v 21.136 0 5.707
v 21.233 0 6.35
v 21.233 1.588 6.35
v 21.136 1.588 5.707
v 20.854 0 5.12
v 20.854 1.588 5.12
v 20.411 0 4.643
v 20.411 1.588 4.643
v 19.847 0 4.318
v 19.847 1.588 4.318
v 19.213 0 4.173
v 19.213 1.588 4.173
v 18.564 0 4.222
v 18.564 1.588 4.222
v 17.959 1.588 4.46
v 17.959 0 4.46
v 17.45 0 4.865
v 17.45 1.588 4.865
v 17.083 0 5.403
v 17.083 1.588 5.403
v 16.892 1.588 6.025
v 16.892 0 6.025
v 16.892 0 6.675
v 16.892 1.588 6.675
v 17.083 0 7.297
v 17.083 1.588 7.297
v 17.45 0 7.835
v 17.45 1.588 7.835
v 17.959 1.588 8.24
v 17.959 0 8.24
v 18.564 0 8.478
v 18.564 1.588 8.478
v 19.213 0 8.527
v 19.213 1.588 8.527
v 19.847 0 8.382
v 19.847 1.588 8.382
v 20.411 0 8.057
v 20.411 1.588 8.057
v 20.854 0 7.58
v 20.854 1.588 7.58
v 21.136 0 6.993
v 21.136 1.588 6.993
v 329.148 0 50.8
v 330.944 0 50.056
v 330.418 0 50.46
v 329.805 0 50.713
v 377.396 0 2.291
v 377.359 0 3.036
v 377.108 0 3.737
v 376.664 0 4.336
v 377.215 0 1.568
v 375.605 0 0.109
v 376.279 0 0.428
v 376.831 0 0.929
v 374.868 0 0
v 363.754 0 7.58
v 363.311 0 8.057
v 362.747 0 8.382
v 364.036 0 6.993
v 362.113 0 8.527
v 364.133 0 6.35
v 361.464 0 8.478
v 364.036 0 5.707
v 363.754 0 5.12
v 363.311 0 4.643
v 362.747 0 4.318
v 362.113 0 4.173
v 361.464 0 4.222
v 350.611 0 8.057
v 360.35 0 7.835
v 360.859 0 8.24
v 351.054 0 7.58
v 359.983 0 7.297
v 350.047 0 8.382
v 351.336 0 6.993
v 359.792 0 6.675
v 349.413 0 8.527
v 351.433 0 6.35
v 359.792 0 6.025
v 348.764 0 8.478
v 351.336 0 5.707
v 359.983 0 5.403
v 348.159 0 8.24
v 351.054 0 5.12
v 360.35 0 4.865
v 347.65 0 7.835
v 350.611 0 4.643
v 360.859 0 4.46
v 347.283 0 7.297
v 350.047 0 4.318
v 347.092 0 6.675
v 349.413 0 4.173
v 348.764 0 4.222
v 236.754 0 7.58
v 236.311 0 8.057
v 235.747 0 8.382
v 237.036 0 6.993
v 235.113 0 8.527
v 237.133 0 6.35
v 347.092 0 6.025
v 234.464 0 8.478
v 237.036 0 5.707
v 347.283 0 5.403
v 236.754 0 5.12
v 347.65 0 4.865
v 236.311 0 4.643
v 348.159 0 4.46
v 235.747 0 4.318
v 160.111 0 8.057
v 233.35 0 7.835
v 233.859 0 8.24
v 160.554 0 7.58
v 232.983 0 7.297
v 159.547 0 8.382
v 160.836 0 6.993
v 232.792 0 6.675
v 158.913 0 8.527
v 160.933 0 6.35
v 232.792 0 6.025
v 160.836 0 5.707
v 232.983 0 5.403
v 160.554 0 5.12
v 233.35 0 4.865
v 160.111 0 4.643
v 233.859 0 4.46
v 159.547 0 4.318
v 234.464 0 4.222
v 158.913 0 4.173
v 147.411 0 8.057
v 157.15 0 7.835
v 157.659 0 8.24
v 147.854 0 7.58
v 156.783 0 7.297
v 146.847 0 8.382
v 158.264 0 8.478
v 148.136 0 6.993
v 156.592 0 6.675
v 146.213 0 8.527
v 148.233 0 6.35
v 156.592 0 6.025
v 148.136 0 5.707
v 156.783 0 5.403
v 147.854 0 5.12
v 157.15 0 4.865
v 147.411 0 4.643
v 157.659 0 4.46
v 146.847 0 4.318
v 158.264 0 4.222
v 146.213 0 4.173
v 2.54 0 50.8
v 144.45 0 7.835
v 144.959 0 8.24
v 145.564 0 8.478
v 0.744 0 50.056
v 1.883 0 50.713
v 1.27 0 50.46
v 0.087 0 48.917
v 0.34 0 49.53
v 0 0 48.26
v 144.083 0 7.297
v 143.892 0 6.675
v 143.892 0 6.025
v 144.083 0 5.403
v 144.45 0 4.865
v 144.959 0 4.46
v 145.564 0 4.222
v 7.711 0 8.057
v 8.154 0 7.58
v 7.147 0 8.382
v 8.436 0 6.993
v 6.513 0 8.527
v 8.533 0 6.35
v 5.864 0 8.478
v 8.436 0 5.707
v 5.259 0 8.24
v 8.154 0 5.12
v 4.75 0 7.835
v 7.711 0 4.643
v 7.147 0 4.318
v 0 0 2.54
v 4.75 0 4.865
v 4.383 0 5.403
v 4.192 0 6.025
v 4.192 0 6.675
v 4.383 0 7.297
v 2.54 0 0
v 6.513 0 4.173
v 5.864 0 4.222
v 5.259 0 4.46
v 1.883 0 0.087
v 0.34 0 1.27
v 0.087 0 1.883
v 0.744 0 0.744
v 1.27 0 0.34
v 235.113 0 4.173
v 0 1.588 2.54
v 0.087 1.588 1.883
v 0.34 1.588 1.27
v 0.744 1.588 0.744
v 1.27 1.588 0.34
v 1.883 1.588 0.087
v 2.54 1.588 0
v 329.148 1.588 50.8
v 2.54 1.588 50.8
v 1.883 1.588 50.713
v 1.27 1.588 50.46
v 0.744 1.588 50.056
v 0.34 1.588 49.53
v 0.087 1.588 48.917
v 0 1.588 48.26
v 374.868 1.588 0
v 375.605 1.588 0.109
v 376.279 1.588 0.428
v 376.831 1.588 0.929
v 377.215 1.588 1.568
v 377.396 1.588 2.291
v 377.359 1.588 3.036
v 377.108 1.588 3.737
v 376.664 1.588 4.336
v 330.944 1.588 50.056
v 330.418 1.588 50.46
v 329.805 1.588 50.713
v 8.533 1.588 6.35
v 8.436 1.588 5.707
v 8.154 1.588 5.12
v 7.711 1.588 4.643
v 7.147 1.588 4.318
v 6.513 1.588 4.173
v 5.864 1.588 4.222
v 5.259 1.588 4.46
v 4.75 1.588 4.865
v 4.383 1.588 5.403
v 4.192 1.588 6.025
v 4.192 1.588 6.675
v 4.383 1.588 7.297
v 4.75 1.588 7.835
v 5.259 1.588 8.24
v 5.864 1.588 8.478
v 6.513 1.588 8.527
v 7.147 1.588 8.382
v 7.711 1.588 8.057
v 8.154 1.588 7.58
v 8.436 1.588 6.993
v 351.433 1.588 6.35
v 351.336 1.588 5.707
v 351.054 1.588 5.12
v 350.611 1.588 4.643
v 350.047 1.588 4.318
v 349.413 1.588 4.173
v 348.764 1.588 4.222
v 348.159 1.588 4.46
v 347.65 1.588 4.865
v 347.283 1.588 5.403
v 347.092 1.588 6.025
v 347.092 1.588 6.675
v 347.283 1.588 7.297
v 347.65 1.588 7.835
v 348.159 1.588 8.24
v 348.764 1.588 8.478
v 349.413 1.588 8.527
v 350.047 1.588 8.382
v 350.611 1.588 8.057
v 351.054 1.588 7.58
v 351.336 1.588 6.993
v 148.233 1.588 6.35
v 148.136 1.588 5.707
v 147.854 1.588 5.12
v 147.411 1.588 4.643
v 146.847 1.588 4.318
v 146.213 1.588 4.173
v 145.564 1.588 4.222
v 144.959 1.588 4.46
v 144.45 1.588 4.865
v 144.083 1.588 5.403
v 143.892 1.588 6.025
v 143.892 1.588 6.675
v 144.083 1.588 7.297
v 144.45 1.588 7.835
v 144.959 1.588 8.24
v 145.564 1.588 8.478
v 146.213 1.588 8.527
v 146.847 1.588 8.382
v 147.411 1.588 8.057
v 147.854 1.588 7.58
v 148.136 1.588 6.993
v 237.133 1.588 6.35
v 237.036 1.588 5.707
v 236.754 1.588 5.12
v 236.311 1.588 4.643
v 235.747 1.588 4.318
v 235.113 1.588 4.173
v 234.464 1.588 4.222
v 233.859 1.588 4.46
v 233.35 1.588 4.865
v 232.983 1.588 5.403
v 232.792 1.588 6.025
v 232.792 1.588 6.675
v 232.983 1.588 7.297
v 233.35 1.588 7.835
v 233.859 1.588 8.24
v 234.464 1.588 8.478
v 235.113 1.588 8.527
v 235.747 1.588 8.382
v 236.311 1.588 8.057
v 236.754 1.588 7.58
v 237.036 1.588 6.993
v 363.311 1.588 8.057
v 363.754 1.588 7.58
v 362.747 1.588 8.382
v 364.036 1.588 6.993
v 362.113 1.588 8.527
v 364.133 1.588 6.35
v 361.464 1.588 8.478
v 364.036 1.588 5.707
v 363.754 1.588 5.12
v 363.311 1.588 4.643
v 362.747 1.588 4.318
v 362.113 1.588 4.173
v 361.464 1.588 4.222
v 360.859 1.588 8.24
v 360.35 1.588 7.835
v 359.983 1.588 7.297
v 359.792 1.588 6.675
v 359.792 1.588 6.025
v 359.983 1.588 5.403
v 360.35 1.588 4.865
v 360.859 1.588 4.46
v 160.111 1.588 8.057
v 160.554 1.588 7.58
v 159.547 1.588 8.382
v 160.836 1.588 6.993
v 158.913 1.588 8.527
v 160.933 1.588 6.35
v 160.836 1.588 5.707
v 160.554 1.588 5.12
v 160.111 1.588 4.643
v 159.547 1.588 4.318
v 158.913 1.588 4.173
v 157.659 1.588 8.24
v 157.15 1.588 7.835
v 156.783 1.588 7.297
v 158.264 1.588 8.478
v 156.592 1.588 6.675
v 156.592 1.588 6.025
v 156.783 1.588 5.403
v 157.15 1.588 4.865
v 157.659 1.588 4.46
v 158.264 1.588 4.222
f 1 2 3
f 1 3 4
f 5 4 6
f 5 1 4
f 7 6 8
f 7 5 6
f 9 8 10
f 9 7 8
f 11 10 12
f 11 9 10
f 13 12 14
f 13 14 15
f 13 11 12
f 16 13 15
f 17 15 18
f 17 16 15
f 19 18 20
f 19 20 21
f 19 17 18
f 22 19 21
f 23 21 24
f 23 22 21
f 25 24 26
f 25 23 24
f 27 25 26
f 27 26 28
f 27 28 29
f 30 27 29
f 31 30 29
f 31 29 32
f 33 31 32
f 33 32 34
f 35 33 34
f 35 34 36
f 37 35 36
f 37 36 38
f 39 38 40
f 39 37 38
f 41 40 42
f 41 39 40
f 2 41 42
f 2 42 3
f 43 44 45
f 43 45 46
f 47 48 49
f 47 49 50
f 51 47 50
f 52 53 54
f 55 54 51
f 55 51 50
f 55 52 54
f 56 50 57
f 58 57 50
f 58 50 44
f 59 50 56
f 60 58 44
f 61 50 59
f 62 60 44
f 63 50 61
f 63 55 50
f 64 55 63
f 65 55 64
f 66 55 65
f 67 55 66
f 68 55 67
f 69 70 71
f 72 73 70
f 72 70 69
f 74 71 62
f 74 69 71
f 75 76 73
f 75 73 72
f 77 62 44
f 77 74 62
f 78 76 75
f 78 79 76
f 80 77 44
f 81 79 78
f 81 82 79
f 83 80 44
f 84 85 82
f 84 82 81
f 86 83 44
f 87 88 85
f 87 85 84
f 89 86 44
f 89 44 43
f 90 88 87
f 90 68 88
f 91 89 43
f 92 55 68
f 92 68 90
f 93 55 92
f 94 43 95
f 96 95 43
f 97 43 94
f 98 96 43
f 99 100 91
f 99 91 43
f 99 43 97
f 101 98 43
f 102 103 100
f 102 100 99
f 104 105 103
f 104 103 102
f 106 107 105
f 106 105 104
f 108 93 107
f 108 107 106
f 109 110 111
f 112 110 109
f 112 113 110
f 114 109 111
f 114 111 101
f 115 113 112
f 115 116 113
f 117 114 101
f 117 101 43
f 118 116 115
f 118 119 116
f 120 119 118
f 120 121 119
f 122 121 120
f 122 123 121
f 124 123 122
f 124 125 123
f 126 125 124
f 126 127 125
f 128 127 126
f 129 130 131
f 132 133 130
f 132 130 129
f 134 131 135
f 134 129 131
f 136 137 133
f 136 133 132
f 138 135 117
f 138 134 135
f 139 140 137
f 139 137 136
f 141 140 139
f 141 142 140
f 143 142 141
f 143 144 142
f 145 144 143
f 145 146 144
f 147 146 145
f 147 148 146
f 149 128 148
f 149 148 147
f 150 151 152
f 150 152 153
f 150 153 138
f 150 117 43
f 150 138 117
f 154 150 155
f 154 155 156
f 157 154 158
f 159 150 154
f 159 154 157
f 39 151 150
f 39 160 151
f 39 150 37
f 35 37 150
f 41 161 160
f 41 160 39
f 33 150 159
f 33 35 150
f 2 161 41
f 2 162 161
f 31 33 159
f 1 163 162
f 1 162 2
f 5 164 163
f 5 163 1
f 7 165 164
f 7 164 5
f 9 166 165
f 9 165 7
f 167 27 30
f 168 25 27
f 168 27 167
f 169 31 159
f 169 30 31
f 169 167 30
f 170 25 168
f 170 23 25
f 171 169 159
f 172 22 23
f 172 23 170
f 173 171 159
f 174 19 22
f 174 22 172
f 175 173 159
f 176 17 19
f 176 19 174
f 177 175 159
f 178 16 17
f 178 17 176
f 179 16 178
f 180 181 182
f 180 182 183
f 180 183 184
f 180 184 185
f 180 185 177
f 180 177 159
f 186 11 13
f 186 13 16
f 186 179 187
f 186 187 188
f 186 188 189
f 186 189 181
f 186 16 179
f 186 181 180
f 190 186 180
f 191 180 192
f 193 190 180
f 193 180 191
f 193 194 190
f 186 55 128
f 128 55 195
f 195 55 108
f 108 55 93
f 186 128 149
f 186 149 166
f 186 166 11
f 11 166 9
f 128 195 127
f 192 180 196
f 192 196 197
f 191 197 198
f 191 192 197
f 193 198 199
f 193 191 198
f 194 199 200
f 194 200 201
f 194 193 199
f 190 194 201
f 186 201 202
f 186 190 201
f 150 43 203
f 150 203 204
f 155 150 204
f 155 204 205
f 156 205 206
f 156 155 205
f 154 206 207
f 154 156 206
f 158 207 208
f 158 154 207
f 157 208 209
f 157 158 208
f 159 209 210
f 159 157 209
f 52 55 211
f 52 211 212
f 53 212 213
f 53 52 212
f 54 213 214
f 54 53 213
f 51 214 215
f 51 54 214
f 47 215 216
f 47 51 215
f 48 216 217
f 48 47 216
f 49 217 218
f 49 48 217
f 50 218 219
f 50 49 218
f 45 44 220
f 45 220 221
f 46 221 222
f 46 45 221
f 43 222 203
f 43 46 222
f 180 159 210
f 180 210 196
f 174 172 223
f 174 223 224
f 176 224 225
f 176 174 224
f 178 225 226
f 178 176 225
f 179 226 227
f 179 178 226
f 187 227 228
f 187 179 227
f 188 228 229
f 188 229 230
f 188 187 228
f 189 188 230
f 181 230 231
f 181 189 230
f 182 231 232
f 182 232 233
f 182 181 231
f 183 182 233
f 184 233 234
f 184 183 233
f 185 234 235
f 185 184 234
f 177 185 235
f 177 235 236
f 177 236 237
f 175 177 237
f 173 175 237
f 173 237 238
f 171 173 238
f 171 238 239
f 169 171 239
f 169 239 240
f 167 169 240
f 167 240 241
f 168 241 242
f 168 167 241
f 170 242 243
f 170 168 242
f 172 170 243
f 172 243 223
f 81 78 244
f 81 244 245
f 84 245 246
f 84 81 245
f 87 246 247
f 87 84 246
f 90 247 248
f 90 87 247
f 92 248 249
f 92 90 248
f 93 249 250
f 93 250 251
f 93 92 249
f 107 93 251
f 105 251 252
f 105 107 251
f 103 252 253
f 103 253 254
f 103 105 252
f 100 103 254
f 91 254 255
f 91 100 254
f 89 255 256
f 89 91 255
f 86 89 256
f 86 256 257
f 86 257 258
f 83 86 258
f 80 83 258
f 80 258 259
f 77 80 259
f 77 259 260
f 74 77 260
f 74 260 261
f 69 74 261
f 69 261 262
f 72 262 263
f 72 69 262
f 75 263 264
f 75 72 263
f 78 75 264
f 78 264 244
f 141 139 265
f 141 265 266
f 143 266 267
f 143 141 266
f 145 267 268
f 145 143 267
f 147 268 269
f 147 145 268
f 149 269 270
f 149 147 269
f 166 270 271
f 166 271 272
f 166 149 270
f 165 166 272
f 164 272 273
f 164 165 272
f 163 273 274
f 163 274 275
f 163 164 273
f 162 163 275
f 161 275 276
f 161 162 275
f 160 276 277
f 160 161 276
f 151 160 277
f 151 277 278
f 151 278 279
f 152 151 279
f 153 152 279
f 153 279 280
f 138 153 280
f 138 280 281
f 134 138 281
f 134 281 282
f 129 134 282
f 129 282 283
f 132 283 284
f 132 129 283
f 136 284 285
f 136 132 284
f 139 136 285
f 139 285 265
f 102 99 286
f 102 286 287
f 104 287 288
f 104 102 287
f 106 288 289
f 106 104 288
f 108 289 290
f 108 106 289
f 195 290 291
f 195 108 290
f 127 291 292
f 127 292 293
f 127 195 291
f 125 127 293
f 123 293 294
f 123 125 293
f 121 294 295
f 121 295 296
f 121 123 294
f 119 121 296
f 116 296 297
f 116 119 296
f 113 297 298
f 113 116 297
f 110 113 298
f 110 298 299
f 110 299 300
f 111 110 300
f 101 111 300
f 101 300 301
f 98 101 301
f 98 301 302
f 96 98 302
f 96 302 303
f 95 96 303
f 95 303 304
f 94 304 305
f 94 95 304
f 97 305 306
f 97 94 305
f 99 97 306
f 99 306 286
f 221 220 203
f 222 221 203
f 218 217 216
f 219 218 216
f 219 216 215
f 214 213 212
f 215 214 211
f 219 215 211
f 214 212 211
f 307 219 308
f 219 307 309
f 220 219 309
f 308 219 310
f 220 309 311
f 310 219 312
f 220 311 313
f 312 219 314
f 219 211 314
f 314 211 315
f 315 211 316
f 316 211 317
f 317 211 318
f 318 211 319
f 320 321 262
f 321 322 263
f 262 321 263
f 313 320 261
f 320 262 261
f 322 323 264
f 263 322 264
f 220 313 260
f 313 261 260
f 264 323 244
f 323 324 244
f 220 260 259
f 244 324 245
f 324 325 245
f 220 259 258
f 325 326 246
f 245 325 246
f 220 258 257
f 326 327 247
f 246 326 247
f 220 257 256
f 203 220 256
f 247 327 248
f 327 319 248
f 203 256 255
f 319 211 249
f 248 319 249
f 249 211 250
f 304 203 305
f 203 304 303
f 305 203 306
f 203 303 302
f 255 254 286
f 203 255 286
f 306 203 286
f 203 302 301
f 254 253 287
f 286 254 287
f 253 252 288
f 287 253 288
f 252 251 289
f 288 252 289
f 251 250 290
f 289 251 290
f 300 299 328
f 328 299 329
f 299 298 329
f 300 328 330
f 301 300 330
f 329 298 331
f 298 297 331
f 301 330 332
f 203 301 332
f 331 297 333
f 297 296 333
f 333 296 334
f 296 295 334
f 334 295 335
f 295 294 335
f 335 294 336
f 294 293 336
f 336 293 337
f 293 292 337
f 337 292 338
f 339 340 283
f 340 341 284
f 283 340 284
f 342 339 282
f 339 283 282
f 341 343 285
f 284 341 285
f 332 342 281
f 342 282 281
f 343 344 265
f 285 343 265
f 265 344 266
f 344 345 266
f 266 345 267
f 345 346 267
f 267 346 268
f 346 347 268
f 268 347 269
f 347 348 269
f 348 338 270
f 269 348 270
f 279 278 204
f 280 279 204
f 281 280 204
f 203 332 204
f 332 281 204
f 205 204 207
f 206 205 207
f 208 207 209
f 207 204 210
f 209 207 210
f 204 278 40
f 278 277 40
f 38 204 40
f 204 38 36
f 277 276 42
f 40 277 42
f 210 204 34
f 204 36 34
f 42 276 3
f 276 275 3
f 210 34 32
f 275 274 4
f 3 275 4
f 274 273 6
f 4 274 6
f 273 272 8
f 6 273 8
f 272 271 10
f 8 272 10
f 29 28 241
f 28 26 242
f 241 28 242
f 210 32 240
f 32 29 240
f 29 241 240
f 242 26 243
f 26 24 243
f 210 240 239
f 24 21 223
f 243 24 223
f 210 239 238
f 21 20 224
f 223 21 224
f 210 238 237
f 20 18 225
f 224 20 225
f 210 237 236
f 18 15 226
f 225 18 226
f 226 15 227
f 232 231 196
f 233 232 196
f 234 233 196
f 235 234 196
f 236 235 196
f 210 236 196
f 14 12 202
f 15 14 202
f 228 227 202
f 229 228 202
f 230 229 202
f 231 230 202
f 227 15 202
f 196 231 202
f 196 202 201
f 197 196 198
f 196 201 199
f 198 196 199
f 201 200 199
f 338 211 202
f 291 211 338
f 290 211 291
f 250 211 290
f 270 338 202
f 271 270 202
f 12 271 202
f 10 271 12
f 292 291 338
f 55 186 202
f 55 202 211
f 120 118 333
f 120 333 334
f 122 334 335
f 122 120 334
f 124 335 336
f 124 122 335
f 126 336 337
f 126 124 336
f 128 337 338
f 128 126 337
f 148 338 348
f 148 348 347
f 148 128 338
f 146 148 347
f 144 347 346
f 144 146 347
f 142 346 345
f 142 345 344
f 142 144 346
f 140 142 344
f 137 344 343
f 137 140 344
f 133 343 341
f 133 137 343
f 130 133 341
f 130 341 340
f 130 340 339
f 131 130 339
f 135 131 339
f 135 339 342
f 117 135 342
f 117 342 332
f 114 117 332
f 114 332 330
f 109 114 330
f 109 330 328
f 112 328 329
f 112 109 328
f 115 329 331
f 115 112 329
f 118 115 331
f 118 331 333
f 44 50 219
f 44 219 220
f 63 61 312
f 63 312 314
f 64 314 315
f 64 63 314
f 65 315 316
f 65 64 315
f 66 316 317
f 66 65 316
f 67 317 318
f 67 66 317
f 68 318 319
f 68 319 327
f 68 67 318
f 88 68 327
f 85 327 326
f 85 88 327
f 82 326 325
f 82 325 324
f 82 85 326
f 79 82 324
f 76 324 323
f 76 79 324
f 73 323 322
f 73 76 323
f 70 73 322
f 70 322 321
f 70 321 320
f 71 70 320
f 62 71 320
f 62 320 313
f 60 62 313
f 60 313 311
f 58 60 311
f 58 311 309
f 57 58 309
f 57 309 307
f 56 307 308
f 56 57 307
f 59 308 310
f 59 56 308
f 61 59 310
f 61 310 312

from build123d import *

# Parameters (mm, degrees)
SKETCH1_R           = 2.1828125
BOSS_EXTRUDE1_DEPTH = 1.5875


with BuildPart() as part:
    # Sketch1 → Boss-Extrude1 (new body)
    with BuildSketch(Plane(origin=(0, 0, 0), x_dir=(1, 0, 0), z_dir=(0, 1, 0))):
        with BuildLine():
            Line((2.54, 0), (374.867897552, 0))
            ThreePointArc((374.867897552, 0), (377.214551564, -1.567984082), (376.663948776, -4.336051224))
            Line((376.663948776, -4.336051224), (330.943948776, -50.056051224))
            ThreePointArc((330.943948776, -50.056051224), (330.11991347, -50.606654013), (329.147897552, -50.8))
            Line((329.147897552, -50.8), (2.54, -50.8))
            ThreePointArc((2.54, -50.8), (0.743948776, -50.056051224), (0, -48.26))
            Line((0, -48.26), (0, -2.54))
            ThreePointArc((0, -2.54), (0.743948776, -0.743948776), (2.54, 0))
        make_face()
        with Locations((6.35, -6.35)):
            Circle(SKETCH1_R, mode=Mode.SUBTRACT)
        with Locations((19.05, -6.35)):
            Circle(SKETCH1_R, mode=Mode.SUBTRACT)
        with Locations((146.05, -6.35)):
            Circle(SKETCH1_R, mode=Mode.SUBTRACT)
        with Locations((158.75, -6.35)):
            Circle(SKETCH1_R, mode=Mode.SUBTRACT)
        with Locations((349.25, -6.35)):
            Circle(SKETCH1_R, mode=Mode.SUBTRACT)
        with Locations((361.95, -6.35)):
            Circle(SKETCH1_R, mode=Mode.SUBTRACT)
        with Locations((234.95, -6.35)):
            Circle(SKETCH1_R, mode=Mode.SUBTRACT)
    extrude(amount=BOSS_EXTRUDE1_DEPTH)


solid = part.part
